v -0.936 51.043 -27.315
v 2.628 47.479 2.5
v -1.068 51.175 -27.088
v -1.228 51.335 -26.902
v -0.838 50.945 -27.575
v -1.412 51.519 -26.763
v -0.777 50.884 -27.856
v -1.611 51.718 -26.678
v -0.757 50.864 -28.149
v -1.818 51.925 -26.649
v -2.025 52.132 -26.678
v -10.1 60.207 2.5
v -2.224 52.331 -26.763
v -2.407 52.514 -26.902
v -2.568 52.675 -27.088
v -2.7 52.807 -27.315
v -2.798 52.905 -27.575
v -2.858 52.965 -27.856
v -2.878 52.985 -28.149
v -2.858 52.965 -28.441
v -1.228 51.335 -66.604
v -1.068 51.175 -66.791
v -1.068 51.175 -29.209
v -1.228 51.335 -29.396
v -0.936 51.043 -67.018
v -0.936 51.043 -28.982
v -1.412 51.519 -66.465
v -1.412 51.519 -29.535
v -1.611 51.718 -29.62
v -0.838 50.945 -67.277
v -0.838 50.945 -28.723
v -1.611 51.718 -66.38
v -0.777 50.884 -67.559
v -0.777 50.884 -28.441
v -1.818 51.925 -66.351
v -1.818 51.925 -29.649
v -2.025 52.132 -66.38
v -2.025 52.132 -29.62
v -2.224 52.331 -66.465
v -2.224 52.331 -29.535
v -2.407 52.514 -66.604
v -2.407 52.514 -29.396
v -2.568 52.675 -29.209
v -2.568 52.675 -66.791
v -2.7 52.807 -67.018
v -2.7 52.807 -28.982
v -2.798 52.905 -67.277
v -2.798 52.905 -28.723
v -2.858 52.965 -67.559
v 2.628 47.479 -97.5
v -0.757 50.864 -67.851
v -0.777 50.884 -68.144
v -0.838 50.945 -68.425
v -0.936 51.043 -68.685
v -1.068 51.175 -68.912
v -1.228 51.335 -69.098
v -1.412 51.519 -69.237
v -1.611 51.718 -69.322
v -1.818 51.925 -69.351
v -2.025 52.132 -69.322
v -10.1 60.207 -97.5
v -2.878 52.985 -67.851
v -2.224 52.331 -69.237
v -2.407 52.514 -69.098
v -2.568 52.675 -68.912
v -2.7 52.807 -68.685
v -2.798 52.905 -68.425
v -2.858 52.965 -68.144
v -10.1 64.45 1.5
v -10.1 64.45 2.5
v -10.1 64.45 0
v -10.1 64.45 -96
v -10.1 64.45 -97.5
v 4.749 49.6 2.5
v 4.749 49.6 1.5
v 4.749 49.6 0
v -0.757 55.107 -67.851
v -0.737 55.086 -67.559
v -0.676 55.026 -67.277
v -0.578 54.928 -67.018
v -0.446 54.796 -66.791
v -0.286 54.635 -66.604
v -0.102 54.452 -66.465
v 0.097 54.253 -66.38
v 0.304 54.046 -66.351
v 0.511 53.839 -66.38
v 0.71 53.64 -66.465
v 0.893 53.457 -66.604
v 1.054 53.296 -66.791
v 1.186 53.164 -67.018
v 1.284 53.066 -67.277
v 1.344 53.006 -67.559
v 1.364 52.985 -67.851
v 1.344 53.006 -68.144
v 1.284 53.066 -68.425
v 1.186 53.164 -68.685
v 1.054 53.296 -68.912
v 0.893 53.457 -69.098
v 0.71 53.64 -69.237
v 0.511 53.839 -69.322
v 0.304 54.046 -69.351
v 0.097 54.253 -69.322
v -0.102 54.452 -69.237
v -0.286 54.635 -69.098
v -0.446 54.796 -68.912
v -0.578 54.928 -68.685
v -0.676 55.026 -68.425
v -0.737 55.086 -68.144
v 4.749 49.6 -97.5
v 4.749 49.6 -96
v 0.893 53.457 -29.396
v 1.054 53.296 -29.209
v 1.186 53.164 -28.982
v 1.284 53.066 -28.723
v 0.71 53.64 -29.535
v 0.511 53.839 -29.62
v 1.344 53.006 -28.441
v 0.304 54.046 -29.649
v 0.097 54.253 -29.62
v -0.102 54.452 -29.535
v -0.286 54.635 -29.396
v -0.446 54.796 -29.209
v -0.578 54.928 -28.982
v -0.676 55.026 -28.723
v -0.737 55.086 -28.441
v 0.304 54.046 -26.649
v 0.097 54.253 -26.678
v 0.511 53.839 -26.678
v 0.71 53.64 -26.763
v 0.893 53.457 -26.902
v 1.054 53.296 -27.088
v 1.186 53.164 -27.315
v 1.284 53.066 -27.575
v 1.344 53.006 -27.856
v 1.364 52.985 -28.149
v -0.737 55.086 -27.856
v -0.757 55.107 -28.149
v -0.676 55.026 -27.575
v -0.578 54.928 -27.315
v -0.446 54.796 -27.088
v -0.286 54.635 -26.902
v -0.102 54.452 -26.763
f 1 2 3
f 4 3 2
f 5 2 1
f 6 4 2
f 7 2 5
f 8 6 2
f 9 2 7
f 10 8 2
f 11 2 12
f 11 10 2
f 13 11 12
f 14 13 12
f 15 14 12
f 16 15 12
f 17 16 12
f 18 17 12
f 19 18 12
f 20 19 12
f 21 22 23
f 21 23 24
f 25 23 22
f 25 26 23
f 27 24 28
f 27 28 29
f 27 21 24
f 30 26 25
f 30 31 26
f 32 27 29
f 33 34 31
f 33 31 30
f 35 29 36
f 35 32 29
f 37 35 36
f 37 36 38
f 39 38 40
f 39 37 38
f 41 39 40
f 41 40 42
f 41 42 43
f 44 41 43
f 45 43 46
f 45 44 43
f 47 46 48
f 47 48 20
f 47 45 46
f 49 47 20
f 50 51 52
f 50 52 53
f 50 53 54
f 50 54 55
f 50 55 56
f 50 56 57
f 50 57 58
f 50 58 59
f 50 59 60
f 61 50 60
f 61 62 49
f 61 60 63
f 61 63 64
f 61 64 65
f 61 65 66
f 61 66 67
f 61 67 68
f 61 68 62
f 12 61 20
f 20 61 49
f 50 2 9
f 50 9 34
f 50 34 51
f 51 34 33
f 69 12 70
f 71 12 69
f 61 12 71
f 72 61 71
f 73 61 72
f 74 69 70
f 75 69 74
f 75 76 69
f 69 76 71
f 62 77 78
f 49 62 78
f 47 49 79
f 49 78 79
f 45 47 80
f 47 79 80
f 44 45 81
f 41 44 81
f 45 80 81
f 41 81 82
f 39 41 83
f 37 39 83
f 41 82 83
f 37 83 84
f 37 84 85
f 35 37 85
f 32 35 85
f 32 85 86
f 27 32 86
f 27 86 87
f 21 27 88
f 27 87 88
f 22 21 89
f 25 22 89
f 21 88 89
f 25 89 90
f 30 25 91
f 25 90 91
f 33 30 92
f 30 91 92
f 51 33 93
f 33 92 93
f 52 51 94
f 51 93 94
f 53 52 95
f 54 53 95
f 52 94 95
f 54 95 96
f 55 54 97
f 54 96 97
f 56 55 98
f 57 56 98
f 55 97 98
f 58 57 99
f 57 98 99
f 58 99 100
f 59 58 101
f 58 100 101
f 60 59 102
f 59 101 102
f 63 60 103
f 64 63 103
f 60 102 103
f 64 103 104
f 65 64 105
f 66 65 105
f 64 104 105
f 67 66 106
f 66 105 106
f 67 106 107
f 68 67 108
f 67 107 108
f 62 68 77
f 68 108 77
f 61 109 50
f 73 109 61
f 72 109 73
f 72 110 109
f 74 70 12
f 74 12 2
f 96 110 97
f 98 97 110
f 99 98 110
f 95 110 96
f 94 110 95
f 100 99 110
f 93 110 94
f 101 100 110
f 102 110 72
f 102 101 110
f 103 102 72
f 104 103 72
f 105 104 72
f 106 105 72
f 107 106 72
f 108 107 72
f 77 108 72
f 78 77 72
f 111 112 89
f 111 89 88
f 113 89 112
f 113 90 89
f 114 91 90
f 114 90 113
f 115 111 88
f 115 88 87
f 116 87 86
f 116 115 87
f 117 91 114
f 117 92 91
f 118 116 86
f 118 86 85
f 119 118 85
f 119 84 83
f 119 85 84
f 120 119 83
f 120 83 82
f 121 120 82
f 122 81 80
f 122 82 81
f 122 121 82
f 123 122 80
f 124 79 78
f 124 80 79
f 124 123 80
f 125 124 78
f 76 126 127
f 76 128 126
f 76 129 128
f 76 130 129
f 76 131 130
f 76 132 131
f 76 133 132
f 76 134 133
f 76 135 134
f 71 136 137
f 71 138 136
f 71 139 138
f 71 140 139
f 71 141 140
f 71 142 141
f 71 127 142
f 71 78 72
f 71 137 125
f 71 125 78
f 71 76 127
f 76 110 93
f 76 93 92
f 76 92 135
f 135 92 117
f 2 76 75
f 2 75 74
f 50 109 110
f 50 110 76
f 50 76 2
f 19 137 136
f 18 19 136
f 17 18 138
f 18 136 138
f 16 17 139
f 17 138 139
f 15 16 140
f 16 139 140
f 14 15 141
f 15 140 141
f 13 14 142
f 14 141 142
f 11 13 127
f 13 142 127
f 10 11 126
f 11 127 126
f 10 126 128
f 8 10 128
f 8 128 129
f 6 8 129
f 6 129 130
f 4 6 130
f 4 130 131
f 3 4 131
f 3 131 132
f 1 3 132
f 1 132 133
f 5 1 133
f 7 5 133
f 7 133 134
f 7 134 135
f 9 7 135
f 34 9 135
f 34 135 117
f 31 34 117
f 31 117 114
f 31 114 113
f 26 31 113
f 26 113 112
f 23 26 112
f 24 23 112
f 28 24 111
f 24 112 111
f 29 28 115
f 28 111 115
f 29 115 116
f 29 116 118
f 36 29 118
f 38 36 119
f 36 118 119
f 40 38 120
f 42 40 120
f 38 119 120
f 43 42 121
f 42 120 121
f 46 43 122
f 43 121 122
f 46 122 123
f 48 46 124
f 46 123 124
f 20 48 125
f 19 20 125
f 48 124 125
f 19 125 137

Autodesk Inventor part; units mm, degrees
sketch "Sketch1" plane through (0, 0, 0) normal (0, 0, 1) x (1, 0, 0)
  line L0 (0, 50.1071) -> (-7.1, 57.2071) projected
  line L1 (-7.1, 57.2071) -> (-7.1, 0) projected
  line L2 (0, 0) -> (-7.1, 0) projected
  line L3 (0, 50.1071) -> (0, 0) projected
  circle A0 centre (6, -18.6) radius 16.1 projected
  line L4 (-10.1, -18.6) -> (-10.1, 64.4833)
  line L5 (-7.1, 57.2071) -> (-10.1, 60.2071)
  line L6 (-10.1, 60.2071) -> (2.6279, 47.4792)
  line L7 (2.6279, 47.4792) -> (4.7492, 49.6005)
  line L8 (4.7492, 49.6005) -> (-14.184, 68.5338)
  line L9 (-10.1, 64.4833) -> (-10.1, 67.3257)
  point P0 (-10.1, 64.4498)
  dimension "d0" = 18
  dimension "d1" = 3
ref_plane "Work Plane1" through (-7.1, 0, -96) normal (0, 0, -1) x (0, 1, 0)
extrude "Extrusion1" add sketch "Sketch1" against normal up to surface (96 mm away) contours L0 L5 L4 L8 L7 L6
sketch "Sketch2" plane through (-10.1, 64.4498, -96) normal (0.7071, 0.7071, 0) x (-0.7071, 0.7071, 0)
  circle A0 centre (-14.7131, 28.1488) radius 1.5 projected
  circle A1 centre (-14.7131, 67.8512) radius 1.5 projected
  point P0 (-52.7147, 96)
extrude "Extrusion2" cut sketch "Sketch2" against normal through all
sketch "Sketch3" plane through (-10.1, 60.2071, -96) normal (0, 0, -1) x (-1, 0, 0)
  line L0 (0, 4.2426) -> (0, 0) projected
  line L1 (-14.8492, -10.6066) -> (0, 4.2426) projected
  line L2 (-12.7279, -12.7279) -> (-14.8492, -10.6066) projected
  line L3 (0, 0) -> (-12.7279, -12.7279) projected
  point P0 (-10.1, -60.2071)
ref_plane "Work Plane2" through (-7.1, -33.8, -97.5) normal (0, 0, -1) x (0, 1, 0)
extrude "Extrusion3" add sketch "Sketch3" along normal up to surface (1.5 mm away)
sketch "Sketch4" plane through (0, 0, 0) normal (0, 0, 1) x (1, 0, 0)
  line L0 (4.7492, 49.6005) -> (-10.1, 64.4498) projected
  line L1 (-10.1, 64.4498) -> (-10.1, 60.2071) projected
  line L2 (-10.1, 60.2071) -> (2.6279, 47.4792) projected
  line L3 (2.6279, 47.4792) -> (4.7492, 49.6005) projected
  point P0 (0, 0)
ref_plane "Work Plane3" through (-7.1, -33.8, 1.5) normal (0, 0, 1) x (1, 0, 0)
extrude "Extrusion4" add sketch "Sketch4" along normal up to surface (1.5 mm away)
sketch "Sketch5" plane through (-10.1, 60.2071, 1.5) normal (0, 0, 1) x (1, 0, 0)
  line L0 (0, 4.2426) -> (14.8492, -10.6066) projected
  line L1 (0, 0) -> (0, 4.2426) projected
  line L2 (12.7279, -12.7279) -> (0, 0) projected
  line L3 (14.8492, -10.6066) -> (12.7279, -12.7279) projected
  point P0 (10.1, -60.2071)
ref_plane "Work Plane4" through (-8, -1.3502, 2.5) normal (0, 0, 1) x (1, 0, 0)
extrude "Extrusion5" add sketch "Sketch5" along normal up to surface (1 mm away)
properties part number "nozyk"
